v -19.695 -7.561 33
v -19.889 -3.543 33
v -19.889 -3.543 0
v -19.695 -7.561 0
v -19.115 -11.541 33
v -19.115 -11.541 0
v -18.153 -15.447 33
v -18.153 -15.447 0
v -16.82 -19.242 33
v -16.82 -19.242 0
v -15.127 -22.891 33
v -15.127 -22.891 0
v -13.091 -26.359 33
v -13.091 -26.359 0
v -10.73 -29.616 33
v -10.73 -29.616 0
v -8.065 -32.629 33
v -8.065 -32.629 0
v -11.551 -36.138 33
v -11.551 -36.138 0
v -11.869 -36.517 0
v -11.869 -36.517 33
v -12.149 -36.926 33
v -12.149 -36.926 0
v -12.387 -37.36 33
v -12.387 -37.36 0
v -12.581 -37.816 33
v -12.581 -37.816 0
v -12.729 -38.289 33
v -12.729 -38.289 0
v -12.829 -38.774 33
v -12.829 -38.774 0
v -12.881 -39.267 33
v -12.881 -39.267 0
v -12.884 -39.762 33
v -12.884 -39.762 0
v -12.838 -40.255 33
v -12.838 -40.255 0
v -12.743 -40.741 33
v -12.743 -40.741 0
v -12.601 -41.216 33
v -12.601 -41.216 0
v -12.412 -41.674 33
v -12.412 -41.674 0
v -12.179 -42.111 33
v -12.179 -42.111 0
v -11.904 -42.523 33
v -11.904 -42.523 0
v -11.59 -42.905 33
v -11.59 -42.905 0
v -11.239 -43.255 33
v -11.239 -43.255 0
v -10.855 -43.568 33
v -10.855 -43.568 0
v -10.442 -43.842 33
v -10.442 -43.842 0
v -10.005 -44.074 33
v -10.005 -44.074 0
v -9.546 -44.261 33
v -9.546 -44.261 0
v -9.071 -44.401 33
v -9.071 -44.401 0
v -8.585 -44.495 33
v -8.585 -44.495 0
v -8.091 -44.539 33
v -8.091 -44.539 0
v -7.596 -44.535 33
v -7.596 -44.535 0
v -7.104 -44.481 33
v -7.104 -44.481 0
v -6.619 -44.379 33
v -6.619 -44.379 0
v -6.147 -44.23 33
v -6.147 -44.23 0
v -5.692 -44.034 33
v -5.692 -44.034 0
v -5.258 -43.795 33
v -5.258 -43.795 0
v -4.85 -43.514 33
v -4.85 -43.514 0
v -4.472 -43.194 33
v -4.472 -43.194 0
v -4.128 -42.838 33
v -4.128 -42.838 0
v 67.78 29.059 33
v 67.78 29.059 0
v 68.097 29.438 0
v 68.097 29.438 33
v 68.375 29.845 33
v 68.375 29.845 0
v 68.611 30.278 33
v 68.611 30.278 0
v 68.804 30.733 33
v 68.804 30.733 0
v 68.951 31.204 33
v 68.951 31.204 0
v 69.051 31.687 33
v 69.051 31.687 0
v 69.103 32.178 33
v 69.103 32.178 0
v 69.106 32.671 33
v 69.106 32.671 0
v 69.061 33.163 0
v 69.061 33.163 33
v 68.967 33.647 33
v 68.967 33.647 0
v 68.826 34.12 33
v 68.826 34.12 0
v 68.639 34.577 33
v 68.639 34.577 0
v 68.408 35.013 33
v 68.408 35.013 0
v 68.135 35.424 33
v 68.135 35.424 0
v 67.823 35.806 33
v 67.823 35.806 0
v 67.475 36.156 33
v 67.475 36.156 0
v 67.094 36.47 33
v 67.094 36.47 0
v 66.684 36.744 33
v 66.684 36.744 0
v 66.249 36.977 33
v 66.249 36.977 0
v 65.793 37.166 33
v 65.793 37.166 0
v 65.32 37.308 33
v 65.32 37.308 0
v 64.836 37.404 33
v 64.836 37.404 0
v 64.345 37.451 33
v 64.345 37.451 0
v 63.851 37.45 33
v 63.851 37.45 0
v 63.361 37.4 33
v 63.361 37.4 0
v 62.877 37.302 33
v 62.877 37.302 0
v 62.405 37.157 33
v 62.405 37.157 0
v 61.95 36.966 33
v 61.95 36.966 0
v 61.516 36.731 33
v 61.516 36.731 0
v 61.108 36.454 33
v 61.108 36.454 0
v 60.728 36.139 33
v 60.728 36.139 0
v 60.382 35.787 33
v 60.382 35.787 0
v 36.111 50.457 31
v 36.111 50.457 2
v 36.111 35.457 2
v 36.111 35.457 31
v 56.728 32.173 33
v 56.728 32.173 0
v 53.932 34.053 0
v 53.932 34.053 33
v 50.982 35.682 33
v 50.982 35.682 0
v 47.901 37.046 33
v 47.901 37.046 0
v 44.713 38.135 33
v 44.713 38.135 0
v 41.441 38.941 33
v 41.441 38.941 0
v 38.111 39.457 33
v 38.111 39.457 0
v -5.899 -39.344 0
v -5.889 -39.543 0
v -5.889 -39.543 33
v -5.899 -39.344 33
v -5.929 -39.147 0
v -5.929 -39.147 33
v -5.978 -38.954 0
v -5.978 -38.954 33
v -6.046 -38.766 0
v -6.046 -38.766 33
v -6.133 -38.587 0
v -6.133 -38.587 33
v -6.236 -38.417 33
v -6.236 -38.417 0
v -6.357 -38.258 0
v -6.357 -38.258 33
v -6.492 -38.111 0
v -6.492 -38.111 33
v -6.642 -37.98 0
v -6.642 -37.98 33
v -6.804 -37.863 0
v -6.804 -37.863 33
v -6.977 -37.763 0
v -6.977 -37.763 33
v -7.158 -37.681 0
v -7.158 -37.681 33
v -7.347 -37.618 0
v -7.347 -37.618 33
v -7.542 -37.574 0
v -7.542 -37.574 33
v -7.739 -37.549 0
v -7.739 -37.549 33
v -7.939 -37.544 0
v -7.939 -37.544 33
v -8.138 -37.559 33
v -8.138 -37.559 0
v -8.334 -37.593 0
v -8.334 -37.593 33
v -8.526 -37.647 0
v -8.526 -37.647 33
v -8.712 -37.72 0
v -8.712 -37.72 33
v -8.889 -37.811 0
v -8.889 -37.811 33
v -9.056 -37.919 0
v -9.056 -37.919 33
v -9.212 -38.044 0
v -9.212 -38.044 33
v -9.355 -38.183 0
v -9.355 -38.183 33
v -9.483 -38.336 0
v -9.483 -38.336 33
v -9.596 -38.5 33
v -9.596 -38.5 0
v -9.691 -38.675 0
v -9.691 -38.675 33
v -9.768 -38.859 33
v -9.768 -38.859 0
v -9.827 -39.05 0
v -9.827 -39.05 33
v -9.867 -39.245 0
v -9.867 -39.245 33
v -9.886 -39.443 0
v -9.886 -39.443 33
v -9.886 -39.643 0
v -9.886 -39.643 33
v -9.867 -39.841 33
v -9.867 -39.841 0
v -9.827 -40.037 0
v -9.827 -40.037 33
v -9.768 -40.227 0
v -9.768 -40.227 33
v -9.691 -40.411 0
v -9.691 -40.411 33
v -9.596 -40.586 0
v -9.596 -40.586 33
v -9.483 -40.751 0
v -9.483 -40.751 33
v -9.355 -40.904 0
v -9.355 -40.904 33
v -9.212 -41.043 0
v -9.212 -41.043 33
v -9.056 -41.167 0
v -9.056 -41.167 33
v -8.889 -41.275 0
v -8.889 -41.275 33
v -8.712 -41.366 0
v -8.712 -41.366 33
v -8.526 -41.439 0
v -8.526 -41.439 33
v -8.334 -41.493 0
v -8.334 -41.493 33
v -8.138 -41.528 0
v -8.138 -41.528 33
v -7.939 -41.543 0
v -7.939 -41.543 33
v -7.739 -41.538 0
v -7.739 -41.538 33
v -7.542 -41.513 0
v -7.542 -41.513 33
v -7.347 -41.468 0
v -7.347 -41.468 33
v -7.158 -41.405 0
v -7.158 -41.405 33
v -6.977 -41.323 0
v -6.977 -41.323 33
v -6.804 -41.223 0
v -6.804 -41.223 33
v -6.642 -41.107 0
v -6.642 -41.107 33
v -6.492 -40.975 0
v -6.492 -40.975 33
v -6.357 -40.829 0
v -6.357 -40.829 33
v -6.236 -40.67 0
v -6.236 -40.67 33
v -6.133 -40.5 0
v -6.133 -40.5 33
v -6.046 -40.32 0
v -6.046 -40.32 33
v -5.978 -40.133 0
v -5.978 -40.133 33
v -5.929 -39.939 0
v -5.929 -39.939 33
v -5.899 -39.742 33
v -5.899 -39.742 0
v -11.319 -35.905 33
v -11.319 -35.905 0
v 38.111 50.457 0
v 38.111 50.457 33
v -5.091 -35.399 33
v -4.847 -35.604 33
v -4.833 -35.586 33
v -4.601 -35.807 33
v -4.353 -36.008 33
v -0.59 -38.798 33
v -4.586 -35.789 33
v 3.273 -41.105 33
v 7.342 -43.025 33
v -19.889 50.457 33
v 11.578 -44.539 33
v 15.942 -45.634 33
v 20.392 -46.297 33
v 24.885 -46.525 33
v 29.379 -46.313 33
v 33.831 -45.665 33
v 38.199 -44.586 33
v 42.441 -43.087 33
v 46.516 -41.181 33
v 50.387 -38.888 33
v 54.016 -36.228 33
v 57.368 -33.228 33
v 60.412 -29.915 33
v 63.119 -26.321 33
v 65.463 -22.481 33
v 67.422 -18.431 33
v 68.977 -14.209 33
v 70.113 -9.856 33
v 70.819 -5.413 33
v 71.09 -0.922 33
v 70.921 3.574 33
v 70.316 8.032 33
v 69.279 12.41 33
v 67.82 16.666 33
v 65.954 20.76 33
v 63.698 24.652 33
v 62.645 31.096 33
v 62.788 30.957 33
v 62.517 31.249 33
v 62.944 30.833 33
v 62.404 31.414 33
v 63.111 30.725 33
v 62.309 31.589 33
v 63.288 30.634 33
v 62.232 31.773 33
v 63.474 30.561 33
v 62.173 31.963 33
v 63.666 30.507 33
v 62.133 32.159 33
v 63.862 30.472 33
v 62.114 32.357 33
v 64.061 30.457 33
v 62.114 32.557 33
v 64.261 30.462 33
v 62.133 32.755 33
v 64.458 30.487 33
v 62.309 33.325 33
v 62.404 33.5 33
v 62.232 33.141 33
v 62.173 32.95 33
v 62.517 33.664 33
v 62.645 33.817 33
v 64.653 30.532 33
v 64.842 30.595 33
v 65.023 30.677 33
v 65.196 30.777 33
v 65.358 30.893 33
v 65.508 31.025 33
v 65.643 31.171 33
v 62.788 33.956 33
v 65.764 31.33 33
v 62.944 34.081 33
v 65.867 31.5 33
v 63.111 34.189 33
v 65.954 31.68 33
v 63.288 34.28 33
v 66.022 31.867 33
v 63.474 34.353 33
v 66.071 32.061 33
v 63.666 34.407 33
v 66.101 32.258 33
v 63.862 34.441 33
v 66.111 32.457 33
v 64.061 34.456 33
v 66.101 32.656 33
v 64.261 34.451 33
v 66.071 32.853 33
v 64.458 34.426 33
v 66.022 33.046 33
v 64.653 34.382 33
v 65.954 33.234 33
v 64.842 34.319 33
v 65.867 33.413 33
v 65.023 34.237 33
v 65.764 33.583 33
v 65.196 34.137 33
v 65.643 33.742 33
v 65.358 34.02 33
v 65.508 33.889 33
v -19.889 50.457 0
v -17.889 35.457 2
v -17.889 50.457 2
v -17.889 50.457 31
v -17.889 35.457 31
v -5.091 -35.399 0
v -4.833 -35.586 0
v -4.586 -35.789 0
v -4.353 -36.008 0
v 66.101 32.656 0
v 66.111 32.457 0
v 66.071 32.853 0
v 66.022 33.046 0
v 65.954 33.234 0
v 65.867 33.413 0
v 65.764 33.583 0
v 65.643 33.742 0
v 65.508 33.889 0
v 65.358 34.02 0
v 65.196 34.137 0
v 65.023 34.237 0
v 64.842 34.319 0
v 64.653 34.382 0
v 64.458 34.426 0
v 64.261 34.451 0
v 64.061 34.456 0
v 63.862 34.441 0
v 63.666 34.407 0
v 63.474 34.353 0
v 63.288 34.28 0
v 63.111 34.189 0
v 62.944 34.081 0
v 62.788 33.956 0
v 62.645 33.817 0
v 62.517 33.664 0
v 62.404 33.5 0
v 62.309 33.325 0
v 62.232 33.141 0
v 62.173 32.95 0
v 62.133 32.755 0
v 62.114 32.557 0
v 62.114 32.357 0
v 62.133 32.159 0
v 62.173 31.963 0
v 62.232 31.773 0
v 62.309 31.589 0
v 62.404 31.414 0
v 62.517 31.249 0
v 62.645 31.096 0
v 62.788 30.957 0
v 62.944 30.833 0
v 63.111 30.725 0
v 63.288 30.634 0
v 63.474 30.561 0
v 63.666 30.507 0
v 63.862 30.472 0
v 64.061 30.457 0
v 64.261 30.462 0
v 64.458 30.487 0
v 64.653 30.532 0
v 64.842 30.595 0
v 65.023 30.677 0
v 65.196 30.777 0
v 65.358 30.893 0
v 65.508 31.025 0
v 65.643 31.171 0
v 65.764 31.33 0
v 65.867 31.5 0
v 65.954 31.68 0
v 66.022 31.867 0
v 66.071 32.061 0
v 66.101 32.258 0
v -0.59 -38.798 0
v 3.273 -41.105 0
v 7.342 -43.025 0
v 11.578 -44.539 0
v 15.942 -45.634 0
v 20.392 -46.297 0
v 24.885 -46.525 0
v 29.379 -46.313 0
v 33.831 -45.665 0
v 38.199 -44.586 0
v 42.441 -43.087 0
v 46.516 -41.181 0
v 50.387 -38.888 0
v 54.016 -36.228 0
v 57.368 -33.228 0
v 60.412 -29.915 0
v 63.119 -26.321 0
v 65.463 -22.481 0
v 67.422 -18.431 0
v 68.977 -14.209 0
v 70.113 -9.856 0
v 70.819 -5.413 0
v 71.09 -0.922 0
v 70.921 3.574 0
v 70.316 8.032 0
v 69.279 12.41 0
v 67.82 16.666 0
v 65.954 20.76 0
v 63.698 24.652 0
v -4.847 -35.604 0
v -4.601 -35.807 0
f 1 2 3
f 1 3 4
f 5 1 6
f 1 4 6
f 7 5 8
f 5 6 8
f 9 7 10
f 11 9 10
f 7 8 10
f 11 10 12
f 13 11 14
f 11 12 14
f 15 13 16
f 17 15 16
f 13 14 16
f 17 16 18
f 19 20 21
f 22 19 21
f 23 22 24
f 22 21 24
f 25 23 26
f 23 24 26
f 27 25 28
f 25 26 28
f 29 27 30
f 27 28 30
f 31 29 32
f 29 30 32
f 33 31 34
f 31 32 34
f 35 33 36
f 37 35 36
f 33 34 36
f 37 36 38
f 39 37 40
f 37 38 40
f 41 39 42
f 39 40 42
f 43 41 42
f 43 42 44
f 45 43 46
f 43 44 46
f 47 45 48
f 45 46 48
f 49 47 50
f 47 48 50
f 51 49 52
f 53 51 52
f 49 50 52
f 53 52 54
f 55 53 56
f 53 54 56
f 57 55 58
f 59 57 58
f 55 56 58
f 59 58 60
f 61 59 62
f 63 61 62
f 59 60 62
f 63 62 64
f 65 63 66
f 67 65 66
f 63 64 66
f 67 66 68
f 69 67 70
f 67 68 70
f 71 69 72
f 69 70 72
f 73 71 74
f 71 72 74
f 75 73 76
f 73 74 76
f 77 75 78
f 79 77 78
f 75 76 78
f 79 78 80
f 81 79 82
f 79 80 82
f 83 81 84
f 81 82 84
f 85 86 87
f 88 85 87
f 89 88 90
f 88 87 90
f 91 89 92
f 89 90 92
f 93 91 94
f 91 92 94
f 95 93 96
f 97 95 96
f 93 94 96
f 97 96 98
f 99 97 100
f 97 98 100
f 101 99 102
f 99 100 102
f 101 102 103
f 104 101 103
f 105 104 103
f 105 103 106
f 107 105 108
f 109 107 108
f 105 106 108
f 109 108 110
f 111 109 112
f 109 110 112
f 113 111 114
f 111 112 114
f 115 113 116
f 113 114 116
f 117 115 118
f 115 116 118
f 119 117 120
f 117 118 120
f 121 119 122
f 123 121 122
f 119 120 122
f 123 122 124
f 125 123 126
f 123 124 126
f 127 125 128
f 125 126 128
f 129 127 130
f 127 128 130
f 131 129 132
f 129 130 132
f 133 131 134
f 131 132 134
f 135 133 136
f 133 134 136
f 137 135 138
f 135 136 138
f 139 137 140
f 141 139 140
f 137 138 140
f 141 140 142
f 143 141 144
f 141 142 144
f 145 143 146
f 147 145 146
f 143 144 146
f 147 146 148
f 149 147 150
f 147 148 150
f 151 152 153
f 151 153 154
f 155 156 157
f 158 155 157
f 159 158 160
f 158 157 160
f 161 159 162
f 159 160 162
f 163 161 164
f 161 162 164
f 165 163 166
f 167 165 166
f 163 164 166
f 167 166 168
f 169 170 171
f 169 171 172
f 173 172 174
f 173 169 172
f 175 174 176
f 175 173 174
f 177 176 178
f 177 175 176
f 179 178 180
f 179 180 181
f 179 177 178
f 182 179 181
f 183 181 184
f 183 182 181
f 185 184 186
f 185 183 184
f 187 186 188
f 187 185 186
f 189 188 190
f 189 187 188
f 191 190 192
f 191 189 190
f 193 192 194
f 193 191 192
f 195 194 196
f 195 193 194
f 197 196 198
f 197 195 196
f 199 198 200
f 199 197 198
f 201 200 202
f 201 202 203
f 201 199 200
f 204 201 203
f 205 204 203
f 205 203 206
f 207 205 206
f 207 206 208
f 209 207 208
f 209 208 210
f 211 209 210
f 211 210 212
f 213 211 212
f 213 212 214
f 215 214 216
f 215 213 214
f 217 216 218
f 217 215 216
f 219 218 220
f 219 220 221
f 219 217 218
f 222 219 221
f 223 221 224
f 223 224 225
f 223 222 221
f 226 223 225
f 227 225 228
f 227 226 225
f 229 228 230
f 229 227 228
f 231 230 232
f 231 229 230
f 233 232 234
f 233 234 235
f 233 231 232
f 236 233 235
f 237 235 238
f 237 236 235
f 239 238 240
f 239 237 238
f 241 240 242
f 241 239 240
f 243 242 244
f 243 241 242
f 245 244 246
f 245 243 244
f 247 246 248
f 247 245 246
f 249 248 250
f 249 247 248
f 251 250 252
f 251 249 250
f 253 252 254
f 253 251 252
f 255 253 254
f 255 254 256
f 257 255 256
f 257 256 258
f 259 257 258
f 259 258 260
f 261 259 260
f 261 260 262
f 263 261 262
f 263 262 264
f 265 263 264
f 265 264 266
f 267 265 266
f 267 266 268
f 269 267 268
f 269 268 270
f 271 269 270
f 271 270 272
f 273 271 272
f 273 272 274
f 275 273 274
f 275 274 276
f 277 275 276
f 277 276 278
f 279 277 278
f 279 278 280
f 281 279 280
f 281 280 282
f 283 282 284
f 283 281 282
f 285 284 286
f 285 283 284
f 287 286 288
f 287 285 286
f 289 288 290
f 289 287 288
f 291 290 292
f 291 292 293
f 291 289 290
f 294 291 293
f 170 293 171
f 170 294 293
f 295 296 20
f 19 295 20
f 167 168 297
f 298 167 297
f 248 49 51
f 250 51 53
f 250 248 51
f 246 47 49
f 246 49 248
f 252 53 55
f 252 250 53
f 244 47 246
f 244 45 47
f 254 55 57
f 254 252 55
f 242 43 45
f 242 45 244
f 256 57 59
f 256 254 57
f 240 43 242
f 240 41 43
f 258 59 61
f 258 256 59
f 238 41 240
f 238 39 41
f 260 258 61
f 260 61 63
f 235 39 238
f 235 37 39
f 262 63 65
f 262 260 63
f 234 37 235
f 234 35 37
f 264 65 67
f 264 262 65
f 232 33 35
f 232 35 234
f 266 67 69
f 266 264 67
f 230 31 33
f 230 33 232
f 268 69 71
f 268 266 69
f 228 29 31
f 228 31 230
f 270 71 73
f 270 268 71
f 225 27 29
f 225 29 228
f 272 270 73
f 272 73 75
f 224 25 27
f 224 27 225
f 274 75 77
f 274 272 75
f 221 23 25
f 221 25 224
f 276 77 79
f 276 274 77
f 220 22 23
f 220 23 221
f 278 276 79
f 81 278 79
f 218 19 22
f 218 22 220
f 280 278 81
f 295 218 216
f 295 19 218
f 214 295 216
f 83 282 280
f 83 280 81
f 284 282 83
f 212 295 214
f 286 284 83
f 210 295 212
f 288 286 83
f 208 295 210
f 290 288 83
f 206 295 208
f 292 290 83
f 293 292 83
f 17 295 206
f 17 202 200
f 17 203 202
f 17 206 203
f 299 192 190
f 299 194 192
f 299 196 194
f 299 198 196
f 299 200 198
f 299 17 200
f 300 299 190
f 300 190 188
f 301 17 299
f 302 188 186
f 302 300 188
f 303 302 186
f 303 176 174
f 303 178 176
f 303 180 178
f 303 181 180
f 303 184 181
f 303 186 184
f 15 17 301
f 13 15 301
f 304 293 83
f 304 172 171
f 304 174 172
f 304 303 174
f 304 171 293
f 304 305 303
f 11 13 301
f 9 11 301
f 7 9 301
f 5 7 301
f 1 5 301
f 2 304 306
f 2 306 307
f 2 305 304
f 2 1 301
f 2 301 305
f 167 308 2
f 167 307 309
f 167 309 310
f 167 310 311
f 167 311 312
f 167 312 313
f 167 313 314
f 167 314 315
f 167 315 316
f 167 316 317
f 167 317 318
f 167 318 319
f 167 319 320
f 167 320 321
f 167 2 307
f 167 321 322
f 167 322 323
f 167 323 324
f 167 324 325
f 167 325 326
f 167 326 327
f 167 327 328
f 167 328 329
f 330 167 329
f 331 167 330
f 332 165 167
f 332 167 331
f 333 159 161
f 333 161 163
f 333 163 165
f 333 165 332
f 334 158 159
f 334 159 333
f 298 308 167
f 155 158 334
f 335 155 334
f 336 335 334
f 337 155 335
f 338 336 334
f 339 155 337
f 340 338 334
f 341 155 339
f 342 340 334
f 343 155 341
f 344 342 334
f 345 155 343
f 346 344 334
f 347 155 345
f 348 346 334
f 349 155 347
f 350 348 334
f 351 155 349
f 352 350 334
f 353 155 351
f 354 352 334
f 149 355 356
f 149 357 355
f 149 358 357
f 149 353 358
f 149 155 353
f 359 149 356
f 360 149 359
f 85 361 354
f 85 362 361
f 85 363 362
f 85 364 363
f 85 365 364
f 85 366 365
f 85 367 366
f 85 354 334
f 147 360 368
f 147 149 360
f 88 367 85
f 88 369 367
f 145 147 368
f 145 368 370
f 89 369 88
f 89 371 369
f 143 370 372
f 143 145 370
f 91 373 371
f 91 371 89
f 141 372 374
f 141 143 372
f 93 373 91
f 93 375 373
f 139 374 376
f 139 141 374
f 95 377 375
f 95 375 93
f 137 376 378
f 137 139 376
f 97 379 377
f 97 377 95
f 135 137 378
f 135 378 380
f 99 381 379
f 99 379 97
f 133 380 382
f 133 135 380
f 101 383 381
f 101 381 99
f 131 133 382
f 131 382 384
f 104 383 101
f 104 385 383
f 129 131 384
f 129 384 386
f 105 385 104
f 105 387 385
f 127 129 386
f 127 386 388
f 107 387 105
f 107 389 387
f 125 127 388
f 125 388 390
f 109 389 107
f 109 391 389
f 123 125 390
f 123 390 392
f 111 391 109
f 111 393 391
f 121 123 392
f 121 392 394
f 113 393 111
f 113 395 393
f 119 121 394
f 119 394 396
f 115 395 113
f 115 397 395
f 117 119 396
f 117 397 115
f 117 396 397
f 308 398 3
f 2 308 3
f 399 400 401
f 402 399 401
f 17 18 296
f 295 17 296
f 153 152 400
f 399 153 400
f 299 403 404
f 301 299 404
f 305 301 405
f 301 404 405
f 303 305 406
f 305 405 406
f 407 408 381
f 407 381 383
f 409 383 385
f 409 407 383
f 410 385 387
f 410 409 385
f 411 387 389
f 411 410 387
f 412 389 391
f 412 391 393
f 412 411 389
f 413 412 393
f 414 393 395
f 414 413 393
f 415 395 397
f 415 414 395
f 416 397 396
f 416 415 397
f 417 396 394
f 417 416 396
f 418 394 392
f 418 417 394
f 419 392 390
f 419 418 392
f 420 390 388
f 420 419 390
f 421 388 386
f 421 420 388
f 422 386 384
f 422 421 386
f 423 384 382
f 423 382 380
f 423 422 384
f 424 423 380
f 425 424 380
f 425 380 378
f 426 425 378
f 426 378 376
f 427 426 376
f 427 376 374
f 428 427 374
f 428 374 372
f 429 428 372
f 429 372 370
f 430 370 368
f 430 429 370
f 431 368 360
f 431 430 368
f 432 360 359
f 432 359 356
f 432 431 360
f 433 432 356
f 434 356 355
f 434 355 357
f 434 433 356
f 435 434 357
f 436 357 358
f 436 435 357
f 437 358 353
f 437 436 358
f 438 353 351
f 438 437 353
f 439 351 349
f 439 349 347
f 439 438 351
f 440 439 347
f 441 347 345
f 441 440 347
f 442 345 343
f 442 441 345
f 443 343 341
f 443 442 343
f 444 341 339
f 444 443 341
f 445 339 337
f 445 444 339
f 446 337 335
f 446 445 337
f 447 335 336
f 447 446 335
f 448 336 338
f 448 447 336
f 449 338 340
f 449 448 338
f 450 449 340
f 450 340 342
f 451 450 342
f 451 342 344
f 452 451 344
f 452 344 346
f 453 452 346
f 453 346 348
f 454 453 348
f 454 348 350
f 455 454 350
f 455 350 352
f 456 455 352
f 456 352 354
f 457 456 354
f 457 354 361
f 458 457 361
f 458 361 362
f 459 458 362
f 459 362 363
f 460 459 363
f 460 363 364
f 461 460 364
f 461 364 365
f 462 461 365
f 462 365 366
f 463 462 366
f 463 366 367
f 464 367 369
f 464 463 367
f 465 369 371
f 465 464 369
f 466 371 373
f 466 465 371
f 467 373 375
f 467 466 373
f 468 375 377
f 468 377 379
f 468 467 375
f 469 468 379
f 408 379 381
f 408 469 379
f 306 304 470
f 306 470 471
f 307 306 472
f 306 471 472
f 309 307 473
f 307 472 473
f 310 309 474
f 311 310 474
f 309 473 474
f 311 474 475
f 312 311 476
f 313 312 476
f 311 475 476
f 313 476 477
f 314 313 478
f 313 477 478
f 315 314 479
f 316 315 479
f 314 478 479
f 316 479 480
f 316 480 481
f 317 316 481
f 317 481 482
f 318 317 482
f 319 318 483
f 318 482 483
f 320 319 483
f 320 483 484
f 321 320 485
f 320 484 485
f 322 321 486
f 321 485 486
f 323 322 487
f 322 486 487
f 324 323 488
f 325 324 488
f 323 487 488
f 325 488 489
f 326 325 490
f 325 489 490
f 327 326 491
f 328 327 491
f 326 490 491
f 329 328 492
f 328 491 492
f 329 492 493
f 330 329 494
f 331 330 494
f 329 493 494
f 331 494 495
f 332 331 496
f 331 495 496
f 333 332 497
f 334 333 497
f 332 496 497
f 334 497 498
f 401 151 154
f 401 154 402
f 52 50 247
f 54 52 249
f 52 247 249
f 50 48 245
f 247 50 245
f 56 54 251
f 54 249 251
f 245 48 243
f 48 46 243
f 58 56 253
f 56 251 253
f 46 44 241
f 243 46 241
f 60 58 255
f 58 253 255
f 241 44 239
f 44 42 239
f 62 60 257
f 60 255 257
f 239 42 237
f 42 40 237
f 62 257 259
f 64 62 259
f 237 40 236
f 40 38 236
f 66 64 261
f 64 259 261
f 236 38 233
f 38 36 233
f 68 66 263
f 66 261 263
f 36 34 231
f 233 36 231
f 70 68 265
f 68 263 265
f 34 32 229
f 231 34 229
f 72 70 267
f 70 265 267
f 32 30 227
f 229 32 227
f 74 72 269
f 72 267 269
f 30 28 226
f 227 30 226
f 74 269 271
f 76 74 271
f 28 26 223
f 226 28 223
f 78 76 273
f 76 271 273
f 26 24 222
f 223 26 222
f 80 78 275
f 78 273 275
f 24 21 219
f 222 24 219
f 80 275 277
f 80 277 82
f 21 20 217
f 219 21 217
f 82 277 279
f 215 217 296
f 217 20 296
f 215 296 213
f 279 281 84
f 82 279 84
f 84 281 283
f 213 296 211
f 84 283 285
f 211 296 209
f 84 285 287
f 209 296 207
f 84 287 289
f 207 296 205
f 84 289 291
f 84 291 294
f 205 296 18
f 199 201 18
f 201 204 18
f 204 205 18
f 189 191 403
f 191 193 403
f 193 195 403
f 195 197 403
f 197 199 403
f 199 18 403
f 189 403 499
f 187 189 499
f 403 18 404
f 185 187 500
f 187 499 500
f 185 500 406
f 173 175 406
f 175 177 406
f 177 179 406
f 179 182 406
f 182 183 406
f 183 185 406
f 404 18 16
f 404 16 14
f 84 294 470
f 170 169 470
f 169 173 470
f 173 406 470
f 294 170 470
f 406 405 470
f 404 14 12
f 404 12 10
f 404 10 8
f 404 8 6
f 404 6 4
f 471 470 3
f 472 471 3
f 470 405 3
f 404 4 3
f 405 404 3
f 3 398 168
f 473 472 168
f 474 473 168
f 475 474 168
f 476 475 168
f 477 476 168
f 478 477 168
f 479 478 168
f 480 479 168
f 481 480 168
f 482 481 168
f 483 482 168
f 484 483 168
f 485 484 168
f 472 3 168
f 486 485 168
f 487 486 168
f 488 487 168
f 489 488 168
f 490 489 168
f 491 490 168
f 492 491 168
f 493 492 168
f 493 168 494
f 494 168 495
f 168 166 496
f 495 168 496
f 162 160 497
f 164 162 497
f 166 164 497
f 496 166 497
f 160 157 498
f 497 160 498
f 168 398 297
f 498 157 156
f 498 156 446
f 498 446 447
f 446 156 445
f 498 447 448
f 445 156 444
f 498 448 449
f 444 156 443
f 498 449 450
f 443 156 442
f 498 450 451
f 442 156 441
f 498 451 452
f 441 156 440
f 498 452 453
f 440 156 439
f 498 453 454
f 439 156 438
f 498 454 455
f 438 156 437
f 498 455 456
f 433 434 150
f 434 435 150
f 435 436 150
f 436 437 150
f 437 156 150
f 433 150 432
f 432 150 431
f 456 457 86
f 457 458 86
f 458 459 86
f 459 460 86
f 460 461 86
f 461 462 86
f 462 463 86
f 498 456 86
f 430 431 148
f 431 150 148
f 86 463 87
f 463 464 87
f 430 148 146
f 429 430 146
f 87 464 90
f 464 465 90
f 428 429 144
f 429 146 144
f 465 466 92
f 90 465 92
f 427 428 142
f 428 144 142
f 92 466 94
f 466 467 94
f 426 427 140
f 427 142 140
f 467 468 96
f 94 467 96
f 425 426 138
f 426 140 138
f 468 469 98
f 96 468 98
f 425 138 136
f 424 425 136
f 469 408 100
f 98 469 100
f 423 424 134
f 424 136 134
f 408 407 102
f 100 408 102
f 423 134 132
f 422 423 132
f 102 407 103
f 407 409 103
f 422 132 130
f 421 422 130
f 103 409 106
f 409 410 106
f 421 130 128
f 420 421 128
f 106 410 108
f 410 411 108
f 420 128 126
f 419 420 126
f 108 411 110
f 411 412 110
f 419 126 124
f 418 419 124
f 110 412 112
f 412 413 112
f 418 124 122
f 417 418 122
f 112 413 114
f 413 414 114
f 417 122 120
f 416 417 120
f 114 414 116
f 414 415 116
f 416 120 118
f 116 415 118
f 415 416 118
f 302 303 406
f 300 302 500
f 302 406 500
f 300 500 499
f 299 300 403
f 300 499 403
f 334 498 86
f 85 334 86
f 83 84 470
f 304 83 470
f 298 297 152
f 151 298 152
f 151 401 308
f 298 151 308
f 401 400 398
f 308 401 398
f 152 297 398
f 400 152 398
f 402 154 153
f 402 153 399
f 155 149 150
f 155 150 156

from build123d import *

# Parameters (mm, degrees)
F0_R     = 2
F1_DEPTH = 33
F2_W     = 54
F2_H     = 29
F3_DEPTH = 15


with BuildPart() as f1:
    # F0 (on Top) → F1 (new body)
    with BuildSketch(Plane.XY):
        with BuildLine():
            Line((38.111041, 50.456811), (-19.888959, 50.456811))
            Line((-19.888959, 50.456811), (-19.888959, -3.543189))
            ThreePointArc((-19.888959, -3.543189), (-16.820127, -19.241913), (-8.065448, -32.629344))
            Line((-8.065448, -32.629344), (-11.31872, -35.904956))
            Line((-11.31872, -35.904956), (-11.550578, -36.138406))
            ThreePointArc((-11.550578, -36.138406), (-11.238961, -43.254993), (-4.12779, -42.83767))
            Line((-4.12779, -42.83767), (-0.589658, -38.798335))
            ThreePointArc((-0.589658, -38.798335), (57.368005, -33.227692), (63.697868, 24.651973))
            Line((63.697868, 24.651973), (67.779562, 29.059465))
            ThreePointArc((67.779562, 29.059465), (67.475048, 36.155927), (60.381633, 35.787204))
            Line((60.381633, 35.787204), (56.727759, 32.172584))
            ThreePointArc((56.727759, 32.172584), (47.901206, 37.046076), (38.111041, 39.456811))
            Line((38.111041, 39.456811), (38.111041, 50.456811))
        make_face()
        with Locations((-7.888959, -39.543189)):
            Circle(F0_R, mode=Mode.SUBTRACT)
        with BuildLine():
            ThreePointArc((-5.091348, -35.399112), (-4.707802, -35.685698), (-4.353425, -36.007655))
            ThreePointArc((-4.353425, -36.007655), (-4.724132, -35.7055), (-5.091348, -35.399112))
        make_face(mode=Mode.SUBTRACT)
        with Locations((64.111041, 32.456811)):
            Circle(F0_R, mode=Mode.SUBTRACT)
    extrude(amount=F1_DEPTH)

    # F2 (on face) → F3 (cut)
    with BuildSketch(Plane(origin=(0, 50.456811, 0), x_dir=(-1, 0, 0), z_dir=(0, 1, 0))):
        with Locations((-9.111041, 16.5)):
            Rectangle(F2_W, F2_H)
    extrude(amount=-F3_DEPTH, mode=Mode.SUBTRACT)


solid = f1.part
